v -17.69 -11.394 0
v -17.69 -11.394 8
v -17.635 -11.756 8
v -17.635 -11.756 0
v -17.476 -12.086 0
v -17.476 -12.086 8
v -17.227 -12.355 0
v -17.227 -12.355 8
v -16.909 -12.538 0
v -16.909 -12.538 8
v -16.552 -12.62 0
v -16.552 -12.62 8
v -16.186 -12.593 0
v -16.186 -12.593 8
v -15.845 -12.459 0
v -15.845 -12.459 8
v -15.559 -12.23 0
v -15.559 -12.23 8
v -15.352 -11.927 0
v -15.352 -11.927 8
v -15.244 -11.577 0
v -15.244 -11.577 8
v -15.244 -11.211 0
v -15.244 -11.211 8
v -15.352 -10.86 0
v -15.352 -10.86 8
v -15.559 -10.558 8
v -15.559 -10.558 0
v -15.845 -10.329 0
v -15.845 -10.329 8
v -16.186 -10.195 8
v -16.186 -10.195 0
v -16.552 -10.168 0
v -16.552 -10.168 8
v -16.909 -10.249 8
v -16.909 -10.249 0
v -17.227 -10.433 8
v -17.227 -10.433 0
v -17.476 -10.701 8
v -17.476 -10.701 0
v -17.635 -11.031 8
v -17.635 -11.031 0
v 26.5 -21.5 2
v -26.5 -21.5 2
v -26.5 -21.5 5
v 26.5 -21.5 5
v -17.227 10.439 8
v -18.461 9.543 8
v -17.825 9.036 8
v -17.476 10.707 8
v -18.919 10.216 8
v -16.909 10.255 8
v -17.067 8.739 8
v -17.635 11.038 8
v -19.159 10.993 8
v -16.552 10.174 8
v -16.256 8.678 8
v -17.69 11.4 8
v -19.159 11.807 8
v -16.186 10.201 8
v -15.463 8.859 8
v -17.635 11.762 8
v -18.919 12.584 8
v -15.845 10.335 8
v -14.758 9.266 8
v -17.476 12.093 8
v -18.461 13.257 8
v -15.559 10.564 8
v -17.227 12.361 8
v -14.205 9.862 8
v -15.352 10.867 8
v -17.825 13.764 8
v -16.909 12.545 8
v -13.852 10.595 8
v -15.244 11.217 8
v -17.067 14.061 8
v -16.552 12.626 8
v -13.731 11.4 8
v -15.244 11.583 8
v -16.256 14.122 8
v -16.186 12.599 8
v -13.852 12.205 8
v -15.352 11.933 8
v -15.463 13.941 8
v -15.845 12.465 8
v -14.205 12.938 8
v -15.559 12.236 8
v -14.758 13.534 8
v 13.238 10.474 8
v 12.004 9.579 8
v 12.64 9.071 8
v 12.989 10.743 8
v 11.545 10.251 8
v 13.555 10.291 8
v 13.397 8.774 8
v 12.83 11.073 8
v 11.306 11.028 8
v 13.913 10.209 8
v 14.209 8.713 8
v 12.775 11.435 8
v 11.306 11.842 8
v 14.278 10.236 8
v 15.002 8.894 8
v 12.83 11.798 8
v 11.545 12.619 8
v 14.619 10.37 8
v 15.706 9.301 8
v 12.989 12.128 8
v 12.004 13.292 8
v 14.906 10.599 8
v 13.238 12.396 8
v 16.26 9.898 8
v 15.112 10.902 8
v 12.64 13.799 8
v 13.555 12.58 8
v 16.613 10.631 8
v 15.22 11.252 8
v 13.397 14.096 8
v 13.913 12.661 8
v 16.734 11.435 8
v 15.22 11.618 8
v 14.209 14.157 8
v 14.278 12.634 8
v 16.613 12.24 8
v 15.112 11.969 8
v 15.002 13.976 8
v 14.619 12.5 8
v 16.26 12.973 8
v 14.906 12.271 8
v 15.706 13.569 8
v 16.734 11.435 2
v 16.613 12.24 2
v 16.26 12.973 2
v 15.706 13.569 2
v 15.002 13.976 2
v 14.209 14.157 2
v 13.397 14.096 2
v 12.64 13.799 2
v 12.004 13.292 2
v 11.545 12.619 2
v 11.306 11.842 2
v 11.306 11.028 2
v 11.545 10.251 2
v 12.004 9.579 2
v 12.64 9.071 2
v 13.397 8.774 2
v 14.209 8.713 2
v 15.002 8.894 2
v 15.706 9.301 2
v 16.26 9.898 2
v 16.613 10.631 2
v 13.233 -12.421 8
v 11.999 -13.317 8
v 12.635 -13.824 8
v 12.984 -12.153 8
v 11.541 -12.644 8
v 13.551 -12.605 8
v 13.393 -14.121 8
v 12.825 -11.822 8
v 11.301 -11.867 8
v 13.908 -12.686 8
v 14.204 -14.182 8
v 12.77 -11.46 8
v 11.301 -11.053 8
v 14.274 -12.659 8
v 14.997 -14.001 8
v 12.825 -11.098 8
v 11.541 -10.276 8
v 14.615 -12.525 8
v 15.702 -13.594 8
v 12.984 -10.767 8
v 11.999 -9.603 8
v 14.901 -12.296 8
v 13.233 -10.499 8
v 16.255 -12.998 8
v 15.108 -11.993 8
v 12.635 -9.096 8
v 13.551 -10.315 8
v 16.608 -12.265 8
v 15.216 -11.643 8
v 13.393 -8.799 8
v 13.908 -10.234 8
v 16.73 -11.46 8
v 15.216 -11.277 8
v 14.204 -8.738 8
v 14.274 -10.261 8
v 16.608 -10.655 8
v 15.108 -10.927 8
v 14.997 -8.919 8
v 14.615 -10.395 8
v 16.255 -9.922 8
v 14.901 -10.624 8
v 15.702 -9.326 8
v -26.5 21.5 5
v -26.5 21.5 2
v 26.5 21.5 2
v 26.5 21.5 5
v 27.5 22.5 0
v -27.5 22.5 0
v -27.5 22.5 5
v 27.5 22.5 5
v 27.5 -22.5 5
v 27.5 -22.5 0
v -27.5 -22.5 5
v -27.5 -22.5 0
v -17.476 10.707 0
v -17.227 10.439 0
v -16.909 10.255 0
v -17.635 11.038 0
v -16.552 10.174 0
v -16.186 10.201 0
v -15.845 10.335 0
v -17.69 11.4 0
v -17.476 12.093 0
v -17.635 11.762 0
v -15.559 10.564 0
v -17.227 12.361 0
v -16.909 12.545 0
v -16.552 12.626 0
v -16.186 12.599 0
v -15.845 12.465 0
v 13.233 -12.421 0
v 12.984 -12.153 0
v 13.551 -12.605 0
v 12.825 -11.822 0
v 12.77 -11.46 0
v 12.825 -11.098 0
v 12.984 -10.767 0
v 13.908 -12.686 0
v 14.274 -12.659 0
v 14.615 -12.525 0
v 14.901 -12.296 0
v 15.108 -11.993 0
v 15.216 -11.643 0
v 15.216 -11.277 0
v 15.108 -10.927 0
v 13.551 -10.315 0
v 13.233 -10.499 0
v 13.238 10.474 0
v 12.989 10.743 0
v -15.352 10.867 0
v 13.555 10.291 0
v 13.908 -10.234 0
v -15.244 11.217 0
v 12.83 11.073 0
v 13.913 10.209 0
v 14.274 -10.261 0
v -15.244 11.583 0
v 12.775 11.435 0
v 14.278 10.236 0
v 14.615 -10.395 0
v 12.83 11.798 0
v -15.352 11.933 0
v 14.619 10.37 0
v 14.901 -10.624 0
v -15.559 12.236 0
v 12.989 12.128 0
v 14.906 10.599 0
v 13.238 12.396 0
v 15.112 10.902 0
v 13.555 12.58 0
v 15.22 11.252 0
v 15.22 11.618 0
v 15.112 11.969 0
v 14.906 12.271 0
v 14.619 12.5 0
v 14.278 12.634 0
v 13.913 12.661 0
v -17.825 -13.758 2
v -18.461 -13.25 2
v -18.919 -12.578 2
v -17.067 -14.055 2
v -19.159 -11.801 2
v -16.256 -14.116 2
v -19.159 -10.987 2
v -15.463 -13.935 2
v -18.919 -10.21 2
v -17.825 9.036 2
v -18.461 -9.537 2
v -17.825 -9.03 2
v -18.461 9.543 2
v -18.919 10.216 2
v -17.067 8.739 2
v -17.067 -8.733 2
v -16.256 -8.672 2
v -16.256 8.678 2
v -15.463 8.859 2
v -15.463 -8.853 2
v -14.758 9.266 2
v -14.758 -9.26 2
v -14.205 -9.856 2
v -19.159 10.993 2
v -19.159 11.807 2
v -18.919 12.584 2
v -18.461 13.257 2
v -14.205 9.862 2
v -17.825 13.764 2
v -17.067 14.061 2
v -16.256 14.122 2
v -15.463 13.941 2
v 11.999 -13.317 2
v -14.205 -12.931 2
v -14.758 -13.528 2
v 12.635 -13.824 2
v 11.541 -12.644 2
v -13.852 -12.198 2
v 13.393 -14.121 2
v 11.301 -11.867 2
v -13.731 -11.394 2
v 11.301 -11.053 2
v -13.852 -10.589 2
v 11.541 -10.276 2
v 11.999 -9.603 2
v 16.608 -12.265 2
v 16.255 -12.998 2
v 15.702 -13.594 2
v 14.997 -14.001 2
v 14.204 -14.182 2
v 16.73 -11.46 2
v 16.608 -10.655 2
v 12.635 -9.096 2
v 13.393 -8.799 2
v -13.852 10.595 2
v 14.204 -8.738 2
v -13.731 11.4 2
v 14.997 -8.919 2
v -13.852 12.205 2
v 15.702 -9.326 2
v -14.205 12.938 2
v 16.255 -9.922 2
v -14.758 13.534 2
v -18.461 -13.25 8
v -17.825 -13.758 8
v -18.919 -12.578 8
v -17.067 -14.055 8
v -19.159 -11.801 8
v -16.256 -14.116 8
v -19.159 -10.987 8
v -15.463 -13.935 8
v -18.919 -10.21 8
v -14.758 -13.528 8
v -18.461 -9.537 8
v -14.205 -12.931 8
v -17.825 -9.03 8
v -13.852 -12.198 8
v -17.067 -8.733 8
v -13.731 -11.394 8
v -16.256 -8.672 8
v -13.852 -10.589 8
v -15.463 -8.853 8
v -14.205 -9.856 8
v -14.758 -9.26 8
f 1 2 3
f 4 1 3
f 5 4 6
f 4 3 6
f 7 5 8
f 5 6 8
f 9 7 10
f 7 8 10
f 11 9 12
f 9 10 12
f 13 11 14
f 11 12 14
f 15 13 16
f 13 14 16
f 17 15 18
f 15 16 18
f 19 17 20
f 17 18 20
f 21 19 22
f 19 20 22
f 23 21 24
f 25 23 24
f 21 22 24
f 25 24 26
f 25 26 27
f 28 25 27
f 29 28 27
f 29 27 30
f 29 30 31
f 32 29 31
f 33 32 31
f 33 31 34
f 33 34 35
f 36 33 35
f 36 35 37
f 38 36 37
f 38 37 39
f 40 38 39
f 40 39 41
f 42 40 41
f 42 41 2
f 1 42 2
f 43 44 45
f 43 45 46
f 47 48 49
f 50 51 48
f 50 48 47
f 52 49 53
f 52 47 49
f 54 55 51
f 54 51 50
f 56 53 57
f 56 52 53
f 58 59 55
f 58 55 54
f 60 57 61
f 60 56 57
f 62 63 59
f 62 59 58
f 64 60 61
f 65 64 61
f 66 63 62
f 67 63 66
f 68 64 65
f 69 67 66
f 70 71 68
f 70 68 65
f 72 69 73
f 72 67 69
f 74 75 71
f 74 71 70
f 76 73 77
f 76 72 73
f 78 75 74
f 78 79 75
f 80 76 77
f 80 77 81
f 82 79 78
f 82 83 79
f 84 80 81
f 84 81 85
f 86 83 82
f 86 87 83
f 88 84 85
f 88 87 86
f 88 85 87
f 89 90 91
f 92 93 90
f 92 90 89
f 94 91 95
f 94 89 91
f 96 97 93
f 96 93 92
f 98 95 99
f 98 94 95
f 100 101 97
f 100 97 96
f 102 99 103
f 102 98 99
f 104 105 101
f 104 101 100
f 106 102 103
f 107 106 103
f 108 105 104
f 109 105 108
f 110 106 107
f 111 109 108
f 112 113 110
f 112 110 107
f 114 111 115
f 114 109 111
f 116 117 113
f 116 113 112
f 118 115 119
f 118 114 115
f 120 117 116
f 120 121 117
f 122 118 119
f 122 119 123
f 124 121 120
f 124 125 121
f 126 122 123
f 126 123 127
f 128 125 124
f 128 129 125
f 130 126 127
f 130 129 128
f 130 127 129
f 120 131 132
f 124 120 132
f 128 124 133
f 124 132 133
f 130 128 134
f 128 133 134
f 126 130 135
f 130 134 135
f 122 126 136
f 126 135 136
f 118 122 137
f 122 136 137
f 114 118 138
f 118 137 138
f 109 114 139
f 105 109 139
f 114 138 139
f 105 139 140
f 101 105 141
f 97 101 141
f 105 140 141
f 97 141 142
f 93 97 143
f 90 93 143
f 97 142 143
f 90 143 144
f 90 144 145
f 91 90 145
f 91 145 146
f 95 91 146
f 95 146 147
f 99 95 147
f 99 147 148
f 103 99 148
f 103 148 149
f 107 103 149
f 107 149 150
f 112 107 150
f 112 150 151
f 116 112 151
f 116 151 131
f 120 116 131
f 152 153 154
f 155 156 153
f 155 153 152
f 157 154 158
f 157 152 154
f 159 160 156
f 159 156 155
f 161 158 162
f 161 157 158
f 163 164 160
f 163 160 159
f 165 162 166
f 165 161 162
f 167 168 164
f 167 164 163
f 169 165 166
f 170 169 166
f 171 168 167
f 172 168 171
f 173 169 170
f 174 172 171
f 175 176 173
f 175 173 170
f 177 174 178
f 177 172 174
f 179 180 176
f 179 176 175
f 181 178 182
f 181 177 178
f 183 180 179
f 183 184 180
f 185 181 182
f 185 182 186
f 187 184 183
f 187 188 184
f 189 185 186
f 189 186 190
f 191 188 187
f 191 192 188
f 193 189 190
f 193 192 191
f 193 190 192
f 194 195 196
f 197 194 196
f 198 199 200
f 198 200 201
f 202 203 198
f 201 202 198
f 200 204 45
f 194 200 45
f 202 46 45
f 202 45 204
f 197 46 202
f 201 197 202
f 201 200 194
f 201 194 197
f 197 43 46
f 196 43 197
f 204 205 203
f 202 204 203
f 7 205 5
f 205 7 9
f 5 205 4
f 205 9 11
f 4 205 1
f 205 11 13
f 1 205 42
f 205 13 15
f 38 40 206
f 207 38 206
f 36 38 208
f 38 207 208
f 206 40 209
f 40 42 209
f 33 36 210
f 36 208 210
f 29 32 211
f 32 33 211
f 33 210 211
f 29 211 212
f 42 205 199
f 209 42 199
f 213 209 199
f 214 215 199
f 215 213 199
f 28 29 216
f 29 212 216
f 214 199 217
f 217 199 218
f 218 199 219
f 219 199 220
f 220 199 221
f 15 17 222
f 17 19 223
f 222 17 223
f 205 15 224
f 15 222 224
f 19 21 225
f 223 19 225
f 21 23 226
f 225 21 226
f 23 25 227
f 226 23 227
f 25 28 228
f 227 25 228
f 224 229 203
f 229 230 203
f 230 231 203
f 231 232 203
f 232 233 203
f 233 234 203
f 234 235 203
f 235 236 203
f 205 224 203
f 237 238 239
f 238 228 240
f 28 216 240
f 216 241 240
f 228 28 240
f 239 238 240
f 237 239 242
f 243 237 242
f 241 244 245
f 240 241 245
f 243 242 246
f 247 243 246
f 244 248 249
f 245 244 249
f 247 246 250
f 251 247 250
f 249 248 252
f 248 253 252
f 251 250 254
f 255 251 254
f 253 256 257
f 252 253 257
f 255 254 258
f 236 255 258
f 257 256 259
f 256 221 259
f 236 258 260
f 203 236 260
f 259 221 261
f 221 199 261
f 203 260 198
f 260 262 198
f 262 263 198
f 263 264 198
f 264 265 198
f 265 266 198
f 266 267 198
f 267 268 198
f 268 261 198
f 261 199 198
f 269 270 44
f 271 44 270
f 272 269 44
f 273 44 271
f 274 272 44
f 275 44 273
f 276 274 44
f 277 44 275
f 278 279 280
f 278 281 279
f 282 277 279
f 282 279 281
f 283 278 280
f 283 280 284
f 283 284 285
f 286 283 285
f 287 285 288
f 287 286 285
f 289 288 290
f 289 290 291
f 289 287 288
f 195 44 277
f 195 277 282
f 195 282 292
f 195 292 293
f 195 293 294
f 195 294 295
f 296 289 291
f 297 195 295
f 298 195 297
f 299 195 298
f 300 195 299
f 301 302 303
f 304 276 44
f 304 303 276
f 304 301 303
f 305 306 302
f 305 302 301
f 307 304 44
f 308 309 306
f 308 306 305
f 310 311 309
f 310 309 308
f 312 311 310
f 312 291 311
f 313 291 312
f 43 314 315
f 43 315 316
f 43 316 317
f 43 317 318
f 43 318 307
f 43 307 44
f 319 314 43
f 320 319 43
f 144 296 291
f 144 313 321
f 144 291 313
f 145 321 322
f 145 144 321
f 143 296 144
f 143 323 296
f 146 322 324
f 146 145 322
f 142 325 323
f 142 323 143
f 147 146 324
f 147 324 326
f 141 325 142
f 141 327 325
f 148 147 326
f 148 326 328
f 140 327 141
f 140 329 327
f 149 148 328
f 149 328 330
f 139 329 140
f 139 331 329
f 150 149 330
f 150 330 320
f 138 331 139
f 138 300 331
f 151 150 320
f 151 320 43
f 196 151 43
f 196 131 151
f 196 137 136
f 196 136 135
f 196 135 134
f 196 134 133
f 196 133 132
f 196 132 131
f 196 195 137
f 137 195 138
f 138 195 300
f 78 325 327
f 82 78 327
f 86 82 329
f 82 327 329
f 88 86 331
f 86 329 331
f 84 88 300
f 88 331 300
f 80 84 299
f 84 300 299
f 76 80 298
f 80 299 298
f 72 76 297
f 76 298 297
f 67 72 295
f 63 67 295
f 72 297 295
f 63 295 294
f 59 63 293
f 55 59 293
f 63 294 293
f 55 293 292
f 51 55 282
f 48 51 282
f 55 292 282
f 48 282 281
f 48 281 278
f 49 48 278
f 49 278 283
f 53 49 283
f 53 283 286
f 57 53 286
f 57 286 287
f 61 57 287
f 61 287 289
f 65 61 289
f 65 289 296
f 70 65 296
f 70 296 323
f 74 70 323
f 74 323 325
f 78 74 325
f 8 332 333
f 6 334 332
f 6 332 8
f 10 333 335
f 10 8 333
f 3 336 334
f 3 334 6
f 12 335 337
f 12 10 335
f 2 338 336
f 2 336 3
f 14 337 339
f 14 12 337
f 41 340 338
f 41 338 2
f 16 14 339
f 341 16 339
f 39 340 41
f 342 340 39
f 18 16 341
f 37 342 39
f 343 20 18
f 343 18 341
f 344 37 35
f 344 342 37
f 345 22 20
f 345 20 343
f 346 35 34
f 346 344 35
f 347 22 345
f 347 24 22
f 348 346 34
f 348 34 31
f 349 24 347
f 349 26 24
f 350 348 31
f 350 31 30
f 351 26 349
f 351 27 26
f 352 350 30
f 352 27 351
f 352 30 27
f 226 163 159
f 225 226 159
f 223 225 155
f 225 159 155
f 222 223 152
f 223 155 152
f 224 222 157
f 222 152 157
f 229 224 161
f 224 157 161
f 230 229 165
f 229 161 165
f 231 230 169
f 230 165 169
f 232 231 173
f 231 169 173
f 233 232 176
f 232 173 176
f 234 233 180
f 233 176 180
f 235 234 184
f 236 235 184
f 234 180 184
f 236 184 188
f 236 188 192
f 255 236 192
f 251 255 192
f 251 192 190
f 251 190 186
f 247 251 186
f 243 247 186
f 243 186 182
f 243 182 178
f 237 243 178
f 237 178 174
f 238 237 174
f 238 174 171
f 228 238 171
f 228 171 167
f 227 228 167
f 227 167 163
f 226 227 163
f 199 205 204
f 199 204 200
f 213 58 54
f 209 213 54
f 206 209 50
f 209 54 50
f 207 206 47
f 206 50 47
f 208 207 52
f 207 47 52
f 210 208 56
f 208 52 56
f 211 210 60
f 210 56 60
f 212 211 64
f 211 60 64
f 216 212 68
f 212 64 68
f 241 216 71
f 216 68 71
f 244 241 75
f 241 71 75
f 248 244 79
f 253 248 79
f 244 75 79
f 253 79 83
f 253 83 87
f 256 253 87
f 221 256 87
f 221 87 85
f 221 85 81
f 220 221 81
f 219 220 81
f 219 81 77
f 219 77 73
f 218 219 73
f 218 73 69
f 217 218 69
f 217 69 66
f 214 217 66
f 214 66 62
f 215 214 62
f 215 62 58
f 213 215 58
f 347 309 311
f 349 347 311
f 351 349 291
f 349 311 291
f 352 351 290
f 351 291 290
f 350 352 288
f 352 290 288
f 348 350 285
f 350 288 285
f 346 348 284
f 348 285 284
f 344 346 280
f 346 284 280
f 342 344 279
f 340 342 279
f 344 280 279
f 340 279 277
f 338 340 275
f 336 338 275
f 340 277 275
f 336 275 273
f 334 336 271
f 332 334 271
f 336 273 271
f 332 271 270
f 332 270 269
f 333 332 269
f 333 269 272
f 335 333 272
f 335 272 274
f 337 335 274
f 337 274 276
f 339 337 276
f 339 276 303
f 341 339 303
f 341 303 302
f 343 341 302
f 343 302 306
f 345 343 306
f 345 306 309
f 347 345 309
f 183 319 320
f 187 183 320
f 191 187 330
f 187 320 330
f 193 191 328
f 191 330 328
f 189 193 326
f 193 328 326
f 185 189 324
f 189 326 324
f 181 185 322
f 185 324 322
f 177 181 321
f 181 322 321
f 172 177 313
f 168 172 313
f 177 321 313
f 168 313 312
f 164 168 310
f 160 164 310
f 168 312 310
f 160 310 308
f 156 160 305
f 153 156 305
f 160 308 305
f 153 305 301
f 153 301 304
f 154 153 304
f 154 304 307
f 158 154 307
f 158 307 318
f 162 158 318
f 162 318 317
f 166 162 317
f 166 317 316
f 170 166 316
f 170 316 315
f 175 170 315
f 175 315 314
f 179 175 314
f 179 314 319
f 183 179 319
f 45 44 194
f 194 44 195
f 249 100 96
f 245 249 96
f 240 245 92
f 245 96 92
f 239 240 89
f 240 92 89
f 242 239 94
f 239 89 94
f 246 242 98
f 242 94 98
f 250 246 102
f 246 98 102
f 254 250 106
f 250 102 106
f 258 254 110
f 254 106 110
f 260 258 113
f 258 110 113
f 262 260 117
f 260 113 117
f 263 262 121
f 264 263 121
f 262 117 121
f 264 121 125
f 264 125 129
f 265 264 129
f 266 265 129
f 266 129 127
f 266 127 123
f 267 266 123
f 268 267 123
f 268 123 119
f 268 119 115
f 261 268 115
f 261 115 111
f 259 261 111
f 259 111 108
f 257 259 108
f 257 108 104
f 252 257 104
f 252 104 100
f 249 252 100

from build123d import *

# Parameters (mm, degrees)
F5_W      = 55
F5_H      = 45
F6_DEPTH  = 5
F4_W      = 53
F4_H      = 43
F7_DEPTH  = 10
F8_DEPTH  = 2
F9_R      = 2.7295
F10_DEPTH = 8
F11_D     = 2.459


with BuildPart() as f6:
    # F5 (on Top) → F6 (new body)
    with BuildSketch(Plane.XY):
        Rectangle(F5_W, F5_H)
    extrude(amount=F6_DEPTH)

    # F4 (on Top) → F7 (cut)
    with BuildSketch(Plane.XY):
        Rectangle(F4_W, F4_H)
    extrude(amount=F7_DEPTH, mode=Mode.SUBTRACT)

    # F4 (on Top) → F8 (join)
    with BuildSketch(Plane.XY):
        Rectangle(F4_W, F4_H)
    extrude(amount=F8_DEPTH)

    # F9 (on Top) → F10 (join)
    with BuildSketch(Plane.XY):
        with Locations((-16.46, 11.4)):
            Circle(F9_R)
        with Locations((14, -11.46)):
            Circle(F9_R)
        with Locations((14.0045639127, 11.4351585507)):
            Circle(F9_R)
        with Locations((-16.46, -11.3938525319)):
            Circle(F9_R)
    extrude(amount=F10_DEPTH)

    # F11 (through all)
    with Locations(Plane(origin=(0, 0, 0), x_dir=(1, 0, 0), z_dir=(0, 0, -1))):
        with Locations((-16.46, -11.4), (14, 11.46), (14.0045639127, -11.4351585507), (-16.46, 11.3938525319)):
            Hole(F11_D / 2)


solid = f6.part
